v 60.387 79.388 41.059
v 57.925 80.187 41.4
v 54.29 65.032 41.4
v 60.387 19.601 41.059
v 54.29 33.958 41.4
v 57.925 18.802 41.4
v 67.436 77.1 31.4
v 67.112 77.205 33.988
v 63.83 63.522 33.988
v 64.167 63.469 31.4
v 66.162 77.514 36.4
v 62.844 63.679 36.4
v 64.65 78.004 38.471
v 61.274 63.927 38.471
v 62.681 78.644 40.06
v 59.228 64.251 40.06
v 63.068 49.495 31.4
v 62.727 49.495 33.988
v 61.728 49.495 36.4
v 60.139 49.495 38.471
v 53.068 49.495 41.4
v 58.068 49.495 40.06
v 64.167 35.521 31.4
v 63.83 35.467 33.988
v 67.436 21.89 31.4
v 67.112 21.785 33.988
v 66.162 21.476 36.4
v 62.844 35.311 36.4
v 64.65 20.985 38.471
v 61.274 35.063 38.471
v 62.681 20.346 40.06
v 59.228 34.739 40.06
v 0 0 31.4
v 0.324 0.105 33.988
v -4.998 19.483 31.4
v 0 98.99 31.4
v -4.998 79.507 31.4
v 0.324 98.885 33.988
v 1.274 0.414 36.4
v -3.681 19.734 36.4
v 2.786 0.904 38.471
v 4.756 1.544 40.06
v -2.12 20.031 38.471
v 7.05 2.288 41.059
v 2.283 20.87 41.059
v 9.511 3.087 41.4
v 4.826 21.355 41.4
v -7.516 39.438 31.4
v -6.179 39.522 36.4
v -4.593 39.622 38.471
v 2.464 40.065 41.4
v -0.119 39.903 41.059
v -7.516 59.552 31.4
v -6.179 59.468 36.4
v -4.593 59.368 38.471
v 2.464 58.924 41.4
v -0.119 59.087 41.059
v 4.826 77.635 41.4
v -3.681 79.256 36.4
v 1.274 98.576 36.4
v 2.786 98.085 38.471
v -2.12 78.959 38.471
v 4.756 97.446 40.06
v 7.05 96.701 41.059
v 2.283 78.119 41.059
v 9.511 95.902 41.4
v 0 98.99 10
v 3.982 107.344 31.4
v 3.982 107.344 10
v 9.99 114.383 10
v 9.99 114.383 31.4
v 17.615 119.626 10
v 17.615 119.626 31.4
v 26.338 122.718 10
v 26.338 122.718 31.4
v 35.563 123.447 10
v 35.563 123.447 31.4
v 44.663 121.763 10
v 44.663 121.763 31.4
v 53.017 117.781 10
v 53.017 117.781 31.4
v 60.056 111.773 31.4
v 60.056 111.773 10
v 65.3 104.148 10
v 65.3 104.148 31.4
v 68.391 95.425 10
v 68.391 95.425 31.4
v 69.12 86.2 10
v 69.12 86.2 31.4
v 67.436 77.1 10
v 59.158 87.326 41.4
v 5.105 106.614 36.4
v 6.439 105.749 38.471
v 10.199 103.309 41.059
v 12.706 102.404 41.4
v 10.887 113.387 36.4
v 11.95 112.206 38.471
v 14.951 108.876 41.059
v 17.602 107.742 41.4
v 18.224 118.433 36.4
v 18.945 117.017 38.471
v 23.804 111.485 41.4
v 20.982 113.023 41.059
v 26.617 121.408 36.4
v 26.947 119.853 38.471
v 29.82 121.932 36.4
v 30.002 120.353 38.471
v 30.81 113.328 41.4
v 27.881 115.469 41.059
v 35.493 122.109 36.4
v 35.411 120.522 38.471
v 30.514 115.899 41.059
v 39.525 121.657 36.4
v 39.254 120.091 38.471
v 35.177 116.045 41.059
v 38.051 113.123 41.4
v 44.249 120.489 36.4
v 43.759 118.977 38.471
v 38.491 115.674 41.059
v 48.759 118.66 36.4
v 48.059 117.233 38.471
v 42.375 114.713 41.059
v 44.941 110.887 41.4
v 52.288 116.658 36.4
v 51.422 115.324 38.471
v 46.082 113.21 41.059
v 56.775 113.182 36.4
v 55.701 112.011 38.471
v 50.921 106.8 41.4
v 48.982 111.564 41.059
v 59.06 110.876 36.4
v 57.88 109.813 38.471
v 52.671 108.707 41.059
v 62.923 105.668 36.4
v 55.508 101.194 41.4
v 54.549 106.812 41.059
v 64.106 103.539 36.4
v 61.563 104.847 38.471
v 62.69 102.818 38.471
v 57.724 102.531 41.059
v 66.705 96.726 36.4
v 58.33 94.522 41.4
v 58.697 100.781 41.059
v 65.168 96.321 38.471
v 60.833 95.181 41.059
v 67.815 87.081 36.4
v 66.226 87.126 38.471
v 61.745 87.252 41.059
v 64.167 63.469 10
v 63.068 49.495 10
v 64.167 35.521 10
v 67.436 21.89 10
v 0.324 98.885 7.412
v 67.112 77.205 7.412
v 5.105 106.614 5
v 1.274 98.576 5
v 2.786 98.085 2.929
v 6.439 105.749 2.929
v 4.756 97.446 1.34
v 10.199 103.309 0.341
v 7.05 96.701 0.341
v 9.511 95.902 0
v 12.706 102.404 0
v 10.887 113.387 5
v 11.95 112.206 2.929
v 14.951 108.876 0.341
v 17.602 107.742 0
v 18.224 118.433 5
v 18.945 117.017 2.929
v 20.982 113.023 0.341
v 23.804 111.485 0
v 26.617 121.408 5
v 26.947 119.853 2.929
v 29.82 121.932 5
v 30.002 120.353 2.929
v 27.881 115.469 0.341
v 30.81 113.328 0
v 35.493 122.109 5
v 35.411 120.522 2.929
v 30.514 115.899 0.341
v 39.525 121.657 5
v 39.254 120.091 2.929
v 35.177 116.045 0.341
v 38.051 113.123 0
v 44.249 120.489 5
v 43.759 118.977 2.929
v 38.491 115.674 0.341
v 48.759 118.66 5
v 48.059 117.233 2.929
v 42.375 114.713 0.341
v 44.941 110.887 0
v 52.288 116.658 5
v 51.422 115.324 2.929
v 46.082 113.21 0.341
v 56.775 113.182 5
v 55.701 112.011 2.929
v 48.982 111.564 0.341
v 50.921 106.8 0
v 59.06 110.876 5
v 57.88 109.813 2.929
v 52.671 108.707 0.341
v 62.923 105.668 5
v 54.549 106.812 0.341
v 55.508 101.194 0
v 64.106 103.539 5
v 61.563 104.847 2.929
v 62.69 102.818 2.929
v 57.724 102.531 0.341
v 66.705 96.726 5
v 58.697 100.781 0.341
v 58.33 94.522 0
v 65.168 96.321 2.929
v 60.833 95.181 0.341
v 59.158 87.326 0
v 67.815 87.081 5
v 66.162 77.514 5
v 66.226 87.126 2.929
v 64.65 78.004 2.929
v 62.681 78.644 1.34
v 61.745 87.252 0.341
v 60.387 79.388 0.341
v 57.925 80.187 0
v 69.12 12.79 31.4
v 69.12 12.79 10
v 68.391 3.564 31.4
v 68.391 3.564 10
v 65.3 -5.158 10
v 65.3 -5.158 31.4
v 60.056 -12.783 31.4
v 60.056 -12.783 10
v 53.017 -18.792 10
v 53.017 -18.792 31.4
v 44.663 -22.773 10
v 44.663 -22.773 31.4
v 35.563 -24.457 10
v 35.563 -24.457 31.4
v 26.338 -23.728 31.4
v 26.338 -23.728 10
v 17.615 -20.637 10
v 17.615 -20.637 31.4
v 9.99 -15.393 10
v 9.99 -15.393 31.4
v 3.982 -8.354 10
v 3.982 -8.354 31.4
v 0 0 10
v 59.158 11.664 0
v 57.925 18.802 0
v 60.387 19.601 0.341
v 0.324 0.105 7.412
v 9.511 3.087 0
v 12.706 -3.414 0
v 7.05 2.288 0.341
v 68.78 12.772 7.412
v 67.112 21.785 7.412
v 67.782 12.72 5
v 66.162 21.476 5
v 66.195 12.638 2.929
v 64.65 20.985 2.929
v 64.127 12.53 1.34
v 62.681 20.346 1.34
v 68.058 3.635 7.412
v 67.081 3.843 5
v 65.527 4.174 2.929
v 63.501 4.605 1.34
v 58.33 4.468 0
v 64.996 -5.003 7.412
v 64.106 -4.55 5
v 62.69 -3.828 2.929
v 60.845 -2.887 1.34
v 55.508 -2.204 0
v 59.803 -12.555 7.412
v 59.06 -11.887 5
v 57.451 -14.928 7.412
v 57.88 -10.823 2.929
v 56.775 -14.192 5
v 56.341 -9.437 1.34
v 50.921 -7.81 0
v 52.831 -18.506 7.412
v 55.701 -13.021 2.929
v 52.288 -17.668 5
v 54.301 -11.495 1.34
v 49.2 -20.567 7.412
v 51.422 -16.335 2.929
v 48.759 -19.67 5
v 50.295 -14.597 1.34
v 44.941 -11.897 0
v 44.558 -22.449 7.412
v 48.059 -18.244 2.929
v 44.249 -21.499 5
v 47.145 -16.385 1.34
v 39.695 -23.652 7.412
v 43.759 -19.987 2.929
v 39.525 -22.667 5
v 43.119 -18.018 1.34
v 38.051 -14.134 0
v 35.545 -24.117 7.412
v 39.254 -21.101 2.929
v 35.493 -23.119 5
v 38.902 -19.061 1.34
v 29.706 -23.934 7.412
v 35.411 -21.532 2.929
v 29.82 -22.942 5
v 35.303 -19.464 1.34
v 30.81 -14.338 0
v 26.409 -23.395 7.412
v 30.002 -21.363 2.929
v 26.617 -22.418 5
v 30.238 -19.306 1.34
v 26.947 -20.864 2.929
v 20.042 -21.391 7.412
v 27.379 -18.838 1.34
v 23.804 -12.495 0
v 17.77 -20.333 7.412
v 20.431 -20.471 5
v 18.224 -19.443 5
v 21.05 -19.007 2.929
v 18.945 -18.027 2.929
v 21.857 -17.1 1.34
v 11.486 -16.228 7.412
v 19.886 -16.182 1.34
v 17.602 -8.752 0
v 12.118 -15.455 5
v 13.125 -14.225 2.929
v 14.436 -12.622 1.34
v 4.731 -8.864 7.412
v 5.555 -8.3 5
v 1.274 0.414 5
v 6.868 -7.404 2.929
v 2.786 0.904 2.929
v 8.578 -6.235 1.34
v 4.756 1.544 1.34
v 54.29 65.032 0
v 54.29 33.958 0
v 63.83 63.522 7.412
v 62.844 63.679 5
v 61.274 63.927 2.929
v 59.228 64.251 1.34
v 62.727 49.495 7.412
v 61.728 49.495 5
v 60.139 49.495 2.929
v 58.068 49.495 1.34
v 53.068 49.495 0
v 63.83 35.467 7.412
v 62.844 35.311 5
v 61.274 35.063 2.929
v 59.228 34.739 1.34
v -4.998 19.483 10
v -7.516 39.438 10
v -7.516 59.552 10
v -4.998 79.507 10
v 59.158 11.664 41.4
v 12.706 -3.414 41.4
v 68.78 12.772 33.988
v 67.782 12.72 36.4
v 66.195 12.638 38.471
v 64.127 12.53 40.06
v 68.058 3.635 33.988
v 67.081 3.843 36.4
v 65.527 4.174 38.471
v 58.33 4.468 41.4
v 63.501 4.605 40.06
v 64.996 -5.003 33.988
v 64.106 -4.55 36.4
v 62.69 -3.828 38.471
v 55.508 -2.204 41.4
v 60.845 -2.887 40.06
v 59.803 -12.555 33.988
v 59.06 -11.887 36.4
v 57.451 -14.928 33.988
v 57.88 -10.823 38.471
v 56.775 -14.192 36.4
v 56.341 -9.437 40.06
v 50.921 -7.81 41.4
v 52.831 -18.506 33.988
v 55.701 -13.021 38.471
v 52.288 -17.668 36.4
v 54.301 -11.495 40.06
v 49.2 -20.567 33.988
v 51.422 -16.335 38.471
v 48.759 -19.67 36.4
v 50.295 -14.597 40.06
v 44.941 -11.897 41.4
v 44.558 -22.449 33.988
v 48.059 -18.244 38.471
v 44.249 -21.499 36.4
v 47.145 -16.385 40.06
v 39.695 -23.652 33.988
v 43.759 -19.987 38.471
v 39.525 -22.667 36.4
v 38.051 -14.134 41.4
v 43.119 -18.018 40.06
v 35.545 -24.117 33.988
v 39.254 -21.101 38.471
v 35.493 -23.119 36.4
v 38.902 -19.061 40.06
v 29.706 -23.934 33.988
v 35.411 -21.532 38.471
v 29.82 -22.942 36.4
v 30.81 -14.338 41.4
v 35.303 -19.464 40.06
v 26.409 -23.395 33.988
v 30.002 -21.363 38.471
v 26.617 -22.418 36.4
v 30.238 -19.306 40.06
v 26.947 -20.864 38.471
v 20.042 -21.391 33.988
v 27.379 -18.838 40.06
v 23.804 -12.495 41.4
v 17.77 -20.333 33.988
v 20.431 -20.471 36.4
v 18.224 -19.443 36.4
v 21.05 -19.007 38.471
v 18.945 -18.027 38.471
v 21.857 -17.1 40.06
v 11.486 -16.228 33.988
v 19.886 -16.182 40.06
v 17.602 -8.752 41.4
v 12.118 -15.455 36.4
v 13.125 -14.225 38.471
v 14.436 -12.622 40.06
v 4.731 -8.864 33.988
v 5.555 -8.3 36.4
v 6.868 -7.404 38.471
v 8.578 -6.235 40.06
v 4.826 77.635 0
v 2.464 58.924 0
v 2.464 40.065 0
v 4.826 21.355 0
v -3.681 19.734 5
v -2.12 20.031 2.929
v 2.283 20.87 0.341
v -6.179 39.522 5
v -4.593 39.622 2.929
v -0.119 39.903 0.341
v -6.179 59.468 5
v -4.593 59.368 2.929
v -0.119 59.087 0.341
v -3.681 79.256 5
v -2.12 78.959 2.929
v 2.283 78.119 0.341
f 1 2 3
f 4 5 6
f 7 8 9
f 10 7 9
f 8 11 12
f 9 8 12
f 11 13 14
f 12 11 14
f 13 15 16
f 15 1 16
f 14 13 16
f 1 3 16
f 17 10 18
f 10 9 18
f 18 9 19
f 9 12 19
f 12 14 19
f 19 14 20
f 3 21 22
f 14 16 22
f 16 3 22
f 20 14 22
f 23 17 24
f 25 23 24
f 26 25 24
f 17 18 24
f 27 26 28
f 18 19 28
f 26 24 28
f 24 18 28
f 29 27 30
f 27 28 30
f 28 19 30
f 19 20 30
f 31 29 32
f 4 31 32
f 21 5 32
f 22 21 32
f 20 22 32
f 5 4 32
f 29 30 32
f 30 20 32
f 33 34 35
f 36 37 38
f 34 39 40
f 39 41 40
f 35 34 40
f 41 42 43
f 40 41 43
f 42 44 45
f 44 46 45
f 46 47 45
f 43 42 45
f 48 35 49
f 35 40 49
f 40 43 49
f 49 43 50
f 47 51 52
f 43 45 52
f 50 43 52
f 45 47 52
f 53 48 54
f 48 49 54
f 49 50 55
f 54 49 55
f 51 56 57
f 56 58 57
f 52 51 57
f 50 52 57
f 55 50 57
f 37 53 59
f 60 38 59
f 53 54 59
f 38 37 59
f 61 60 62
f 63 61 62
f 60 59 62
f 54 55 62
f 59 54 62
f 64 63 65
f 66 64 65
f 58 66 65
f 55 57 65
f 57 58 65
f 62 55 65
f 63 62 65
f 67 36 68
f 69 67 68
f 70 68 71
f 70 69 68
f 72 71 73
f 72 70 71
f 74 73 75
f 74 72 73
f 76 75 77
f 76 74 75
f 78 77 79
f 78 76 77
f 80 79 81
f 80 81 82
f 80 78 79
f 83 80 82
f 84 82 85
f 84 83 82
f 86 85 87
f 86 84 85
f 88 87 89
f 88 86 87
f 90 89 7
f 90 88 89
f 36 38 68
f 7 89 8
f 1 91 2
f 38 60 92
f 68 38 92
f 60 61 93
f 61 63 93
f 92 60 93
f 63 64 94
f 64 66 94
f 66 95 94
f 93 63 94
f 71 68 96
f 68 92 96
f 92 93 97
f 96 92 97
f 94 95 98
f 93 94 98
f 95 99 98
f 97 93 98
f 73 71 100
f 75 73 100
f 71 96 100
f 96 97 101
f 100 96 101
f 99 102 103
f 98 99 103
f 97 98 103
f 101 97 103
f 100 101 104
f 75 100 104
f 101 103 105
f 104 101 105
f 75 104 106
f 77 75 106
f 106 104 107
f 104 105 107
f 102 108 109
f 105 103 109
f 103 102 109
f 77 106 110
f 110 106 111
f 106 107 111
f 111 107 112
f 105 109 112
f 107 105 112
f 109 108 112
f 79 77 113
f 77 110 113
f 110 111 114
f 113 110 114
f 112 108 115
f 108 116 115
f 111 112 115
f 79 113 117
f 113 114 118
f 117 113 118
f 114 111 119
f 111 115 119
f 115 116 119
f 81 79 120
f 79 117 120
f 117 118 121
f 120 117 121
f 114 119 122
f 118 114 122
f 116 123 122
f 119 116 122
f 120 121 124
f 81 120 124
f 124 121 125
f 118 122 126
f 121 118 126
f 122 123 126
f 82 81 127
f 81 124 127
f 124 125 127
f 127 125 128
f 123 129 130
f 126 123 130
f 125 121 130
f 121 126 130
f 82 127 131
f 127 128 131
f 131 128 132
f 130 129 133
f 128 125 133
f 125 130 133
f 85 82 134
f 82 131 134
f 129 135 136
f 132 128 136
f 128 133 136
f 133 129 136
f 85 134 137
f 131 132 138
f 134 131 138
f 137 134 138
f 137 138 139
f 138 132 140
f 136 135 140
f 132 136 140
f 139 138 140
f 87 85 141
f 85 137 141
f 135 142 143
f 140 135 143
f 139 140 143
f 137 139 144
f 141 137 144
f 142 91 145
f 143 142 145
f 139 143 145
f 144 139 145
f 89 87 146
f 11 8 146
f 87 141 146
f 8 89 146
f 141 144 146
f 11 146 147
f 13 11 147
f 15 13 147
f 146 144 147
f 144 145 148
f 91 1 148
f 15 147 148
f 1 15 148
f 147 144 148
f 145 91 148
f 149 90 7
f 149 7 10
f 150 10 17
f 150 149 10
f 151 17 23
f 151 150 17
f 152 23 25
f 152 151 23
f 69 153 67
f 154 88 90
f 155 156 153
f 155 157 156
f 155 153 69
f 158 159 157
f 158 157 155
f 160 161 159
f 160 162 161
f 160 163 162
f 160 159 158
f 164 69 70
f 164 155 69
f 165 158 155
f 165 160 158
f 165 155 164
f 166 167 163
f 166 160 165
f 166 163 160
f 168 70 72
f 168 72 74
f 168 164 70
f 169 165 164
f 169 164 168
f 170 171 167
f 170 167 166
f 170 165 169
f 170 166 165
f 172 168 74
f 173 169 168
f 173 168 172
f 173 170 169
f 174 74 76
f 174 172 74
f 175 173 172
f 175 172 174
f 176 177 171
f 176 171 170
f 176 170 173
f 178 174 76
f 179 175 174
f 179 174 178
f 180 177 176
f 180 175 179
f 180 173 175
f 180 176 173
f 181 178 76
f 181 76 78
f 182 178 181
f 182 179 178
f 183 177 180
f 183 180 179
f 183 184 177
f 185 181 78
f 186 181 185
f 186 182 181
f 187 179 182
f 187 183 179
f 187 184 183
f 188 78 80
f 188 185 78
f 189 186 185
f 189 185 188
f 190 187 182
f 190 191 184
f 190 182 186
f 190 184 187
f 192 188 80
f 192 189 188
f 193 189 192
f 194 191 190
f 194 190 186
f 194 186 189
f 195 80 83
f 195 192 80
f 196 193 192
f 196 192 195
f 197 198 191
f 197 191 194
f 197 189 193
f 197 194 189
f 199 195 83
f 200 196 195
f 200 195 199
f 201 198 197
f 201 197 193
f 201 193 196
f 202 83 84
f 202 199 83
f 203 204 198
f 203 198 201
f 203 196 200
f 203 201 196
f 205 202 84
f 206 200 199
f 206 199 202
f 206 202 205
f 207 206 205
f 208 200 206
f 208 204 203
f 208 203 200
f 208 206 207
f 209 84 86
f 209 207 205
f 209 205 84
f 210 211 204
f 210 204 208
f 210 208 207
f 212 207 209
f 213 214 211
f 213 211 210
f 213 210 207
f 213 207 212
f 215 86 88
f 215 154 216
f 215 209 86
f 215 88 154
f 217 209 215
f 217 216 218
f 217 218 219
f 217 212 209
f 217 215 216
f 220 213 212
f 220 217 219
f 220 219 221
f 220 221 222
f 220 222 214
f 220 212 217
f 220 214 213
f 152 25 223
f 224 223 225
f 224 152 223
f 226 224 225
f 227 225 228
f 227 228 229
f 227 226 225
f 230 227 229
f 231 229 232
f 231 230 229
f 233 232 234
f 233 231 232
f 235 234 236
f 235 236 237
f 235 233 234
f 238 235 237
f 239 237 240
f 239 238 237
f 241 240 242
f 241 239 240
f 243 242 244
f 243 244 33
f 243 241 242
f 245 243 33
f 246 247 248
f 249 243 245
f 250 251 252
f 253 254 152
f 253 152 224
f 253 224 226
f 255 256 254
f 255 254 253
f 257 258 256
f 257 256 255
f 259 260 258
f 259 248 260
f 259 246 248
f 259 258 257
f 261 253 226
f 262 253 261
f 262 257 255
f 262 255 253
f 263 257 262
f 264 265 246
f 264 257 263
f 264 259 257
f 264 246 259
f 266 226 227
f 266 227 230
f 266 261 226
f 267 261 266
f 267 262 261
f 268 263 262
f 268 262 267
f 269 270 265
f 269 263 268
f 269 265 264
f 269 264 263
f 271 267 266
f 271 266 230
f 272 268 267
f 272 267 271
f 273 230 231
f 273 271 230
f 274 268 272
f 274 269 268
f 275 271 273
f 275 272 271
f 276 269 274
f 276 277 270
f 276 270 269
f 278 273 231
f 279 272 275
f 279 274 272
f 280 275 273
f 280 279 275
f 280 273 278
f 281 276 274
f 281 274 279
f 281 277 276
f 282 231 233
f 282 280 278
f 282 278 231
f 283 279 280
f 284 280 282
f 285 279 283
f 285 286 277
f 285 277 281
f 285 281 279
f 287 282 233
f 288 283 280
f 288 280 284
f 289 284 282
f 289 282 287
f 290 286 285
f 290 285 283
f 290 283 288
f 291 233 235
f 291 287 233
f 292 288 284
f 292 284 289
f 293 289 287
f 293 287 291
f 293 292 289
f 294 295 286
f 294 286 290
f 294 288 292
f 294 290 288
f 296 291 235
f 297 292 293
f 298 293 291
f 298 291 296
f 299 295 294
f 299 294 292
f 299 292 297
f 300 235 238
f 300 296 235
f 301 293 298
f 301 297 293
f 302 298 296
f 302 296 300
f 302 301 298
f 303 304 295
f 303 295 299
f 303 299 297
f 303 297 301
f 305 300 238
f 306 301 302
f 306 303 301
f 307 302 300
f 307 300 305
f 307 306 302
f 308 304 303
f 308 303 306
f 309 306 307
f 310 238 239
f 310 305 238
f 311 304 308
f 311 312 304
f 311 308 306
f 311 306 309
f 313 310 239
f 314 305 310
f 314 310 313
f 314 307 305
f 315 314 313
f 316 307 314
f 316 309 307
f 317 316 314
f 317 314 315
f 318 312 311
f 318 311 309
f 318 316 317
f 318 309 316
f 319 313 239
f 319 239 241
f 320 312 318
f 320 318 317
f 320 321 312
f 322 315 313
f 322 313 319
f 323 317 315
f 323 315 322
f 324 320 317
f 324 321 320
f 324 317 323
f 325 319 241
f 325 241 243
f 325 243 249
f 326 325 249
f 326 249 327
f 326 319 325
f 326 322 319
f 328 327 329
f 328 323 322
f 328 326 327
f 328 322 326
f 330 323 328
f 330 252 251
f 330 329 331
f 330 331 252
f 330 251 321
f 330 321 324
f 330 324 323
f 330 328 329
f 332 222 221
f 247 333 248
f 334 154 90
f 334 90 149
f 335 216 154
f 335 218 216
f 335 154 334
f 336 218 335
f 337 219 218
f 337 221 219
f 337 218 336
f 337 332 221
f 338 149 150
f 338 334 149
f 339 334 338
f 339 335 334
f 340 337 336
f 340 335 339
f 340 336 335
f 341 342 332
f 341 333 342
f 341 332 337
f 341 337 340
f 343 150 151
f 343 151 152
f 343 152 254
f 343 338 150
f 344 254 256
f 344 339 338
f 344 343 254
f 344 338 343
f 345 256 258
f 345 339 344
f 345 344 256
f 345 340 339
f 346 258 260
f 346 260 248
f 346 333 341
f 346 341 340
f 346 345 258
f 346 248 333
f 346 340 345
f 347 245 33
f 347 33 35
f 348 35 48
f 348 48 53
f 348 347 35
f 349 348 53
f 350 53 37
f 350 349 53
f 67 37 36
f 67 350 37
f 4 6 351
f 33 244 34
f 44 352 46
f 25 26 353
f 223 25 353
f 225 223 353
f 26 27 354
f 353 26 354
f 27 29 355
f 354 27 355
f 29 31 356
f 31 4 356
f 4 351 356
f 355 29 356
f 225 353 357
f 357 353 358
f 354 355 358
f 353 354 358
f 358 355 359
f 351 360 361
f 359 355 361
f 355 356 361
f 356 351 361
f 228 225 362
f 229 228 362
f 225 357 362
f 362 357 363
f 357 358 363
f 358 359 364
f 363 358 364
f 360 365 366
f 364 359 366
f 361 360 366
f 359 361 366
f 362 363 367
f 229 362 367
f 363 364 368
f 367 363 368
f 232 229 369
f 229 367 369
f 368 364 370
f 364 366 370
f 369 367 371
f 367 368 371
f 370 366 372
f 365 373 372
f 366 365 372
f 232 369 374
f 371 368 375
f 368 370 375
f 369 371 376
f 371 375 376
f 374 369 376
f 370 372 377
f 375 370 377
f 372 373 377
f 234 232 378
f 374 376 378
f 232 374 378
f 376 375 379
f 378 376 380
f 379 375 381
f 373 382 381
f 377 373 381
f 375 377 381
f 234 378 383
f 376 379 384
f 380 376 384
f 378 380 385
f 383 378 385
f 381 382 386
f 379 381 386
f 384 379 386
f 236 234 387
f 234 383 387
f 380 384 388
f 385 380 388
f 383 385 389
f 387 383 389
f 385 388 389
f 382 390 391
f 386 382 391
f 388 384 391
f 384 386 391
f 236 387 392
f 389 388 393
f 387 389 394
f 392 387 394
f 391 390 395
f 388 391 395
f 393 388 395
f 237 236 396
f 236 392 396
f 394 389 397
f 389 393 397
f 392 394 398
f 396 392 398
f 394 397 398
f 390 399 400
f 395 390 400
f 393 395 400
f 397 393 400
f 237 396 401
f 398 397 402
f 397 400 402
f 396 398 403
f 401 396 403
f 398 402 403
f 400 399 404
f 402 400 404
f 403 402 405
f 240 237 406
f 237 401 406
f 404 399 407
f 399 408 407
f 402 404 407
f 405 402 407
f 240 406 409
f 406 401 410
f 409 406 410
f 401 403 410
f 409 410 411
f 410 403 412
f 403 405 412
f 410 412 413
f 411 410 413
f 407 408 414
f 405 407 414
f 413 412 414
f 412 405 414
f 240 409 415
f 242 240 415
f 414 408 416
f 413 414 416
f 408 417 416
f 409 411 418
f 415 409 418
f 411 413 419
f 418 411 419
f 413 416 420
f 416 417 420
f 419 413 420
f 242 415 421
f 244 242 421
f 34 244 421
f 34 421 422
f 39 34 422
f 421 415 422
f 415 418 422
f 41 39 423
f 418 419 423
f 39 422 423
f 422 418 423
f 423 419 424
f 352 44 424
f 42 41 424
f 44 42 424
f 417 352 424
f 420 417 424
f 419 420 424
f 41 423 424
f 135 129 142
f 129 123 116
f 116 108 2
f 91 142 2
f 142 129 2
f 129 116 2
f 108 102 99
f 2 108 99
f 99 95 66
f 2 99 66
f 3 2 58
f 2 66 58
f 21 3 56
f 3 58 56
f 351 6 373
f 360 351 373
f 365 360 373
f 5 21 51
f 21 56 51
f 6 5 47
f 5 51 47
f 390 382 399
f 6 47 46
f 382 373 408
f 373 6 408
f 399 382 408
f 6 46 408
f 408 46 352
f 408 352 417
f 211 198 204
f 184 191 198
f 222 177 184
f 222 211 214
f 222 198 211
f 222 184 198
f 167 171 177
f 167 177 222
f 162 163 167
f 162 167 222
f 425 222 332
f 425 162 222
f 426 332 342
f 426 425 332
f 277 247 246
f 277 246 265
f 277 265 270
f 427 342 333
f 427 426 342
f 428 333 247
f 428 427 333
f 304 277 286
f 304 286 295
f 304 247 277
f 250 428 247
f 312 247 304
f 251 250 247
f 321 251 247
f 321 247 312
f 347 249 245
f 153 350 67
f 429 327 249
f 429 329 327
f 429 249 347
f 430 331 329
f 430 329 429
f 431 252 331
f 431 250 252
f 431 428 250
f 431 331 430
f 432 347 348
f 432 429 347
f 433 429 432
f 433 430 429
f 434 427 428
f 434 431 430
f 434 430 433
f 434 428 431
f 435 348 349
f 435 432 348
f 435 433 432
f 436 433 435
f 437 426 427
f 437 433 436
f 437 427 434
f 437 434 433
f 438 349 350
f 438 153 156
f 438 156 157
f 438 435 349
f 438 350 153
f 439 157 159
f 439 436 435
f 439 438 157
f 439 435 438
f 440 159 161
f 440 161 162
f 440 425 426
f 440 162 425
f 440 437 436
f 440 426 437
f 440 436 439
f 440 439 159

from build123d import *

# Parameters (mm, degrees)
BOSS_EXTRUDE1_DEPTH = 41.4
FILLET1_R           = 10


with BuildPart() as part:
    # Sketch1 → Boss-Extrude1 (new body)
    with BuildSketch(Plane(origin=(0, 0, 0), x_dir=(0, 1, 0), z_dir=(0, 0, 1))):
        with BuildLine():
            ThreePointArc((0, 0), (49.49489115, 7.831876421), (98.9897823, 0))
            ThreePointArc((98.9897823, 0), (121.763014729, -44.663014729), (77.1, -67.436247159))
            ThreePointArc((77.1, -67.436247159), (49.49489115, -63.068123579), (21.8897823, -67.436247159))
            ThreePointArc((21.8897823, -67.436247159), (-22.773232429, -44.663014729), (0, 0))
        make_face()
    extrude(amount=BOSS_EXTRUDE1_DEPTH)

    # Fillet1
    fillet1_edges = [part.edges().sort_by_distance(p)[0] for p in [
        (44.663014729, 121.763014729, 41.4),
        (-7.831876421, 49.49489115, 41.4),
        (44.663014729, -22.773232429, 41.4),
        (-7.831876421, 49.49489115, 0),
        (44.663014729, 121.763014729, 0),
        (63.068123579, 49.49489115, 0),
        (44.663014729, -22.773232429, 0),
        (63.068123579, 49.49489115, 41.4),
    ]]
    fillet(fillet1_edges, radius=FILLET1_R)


solid = part.part
